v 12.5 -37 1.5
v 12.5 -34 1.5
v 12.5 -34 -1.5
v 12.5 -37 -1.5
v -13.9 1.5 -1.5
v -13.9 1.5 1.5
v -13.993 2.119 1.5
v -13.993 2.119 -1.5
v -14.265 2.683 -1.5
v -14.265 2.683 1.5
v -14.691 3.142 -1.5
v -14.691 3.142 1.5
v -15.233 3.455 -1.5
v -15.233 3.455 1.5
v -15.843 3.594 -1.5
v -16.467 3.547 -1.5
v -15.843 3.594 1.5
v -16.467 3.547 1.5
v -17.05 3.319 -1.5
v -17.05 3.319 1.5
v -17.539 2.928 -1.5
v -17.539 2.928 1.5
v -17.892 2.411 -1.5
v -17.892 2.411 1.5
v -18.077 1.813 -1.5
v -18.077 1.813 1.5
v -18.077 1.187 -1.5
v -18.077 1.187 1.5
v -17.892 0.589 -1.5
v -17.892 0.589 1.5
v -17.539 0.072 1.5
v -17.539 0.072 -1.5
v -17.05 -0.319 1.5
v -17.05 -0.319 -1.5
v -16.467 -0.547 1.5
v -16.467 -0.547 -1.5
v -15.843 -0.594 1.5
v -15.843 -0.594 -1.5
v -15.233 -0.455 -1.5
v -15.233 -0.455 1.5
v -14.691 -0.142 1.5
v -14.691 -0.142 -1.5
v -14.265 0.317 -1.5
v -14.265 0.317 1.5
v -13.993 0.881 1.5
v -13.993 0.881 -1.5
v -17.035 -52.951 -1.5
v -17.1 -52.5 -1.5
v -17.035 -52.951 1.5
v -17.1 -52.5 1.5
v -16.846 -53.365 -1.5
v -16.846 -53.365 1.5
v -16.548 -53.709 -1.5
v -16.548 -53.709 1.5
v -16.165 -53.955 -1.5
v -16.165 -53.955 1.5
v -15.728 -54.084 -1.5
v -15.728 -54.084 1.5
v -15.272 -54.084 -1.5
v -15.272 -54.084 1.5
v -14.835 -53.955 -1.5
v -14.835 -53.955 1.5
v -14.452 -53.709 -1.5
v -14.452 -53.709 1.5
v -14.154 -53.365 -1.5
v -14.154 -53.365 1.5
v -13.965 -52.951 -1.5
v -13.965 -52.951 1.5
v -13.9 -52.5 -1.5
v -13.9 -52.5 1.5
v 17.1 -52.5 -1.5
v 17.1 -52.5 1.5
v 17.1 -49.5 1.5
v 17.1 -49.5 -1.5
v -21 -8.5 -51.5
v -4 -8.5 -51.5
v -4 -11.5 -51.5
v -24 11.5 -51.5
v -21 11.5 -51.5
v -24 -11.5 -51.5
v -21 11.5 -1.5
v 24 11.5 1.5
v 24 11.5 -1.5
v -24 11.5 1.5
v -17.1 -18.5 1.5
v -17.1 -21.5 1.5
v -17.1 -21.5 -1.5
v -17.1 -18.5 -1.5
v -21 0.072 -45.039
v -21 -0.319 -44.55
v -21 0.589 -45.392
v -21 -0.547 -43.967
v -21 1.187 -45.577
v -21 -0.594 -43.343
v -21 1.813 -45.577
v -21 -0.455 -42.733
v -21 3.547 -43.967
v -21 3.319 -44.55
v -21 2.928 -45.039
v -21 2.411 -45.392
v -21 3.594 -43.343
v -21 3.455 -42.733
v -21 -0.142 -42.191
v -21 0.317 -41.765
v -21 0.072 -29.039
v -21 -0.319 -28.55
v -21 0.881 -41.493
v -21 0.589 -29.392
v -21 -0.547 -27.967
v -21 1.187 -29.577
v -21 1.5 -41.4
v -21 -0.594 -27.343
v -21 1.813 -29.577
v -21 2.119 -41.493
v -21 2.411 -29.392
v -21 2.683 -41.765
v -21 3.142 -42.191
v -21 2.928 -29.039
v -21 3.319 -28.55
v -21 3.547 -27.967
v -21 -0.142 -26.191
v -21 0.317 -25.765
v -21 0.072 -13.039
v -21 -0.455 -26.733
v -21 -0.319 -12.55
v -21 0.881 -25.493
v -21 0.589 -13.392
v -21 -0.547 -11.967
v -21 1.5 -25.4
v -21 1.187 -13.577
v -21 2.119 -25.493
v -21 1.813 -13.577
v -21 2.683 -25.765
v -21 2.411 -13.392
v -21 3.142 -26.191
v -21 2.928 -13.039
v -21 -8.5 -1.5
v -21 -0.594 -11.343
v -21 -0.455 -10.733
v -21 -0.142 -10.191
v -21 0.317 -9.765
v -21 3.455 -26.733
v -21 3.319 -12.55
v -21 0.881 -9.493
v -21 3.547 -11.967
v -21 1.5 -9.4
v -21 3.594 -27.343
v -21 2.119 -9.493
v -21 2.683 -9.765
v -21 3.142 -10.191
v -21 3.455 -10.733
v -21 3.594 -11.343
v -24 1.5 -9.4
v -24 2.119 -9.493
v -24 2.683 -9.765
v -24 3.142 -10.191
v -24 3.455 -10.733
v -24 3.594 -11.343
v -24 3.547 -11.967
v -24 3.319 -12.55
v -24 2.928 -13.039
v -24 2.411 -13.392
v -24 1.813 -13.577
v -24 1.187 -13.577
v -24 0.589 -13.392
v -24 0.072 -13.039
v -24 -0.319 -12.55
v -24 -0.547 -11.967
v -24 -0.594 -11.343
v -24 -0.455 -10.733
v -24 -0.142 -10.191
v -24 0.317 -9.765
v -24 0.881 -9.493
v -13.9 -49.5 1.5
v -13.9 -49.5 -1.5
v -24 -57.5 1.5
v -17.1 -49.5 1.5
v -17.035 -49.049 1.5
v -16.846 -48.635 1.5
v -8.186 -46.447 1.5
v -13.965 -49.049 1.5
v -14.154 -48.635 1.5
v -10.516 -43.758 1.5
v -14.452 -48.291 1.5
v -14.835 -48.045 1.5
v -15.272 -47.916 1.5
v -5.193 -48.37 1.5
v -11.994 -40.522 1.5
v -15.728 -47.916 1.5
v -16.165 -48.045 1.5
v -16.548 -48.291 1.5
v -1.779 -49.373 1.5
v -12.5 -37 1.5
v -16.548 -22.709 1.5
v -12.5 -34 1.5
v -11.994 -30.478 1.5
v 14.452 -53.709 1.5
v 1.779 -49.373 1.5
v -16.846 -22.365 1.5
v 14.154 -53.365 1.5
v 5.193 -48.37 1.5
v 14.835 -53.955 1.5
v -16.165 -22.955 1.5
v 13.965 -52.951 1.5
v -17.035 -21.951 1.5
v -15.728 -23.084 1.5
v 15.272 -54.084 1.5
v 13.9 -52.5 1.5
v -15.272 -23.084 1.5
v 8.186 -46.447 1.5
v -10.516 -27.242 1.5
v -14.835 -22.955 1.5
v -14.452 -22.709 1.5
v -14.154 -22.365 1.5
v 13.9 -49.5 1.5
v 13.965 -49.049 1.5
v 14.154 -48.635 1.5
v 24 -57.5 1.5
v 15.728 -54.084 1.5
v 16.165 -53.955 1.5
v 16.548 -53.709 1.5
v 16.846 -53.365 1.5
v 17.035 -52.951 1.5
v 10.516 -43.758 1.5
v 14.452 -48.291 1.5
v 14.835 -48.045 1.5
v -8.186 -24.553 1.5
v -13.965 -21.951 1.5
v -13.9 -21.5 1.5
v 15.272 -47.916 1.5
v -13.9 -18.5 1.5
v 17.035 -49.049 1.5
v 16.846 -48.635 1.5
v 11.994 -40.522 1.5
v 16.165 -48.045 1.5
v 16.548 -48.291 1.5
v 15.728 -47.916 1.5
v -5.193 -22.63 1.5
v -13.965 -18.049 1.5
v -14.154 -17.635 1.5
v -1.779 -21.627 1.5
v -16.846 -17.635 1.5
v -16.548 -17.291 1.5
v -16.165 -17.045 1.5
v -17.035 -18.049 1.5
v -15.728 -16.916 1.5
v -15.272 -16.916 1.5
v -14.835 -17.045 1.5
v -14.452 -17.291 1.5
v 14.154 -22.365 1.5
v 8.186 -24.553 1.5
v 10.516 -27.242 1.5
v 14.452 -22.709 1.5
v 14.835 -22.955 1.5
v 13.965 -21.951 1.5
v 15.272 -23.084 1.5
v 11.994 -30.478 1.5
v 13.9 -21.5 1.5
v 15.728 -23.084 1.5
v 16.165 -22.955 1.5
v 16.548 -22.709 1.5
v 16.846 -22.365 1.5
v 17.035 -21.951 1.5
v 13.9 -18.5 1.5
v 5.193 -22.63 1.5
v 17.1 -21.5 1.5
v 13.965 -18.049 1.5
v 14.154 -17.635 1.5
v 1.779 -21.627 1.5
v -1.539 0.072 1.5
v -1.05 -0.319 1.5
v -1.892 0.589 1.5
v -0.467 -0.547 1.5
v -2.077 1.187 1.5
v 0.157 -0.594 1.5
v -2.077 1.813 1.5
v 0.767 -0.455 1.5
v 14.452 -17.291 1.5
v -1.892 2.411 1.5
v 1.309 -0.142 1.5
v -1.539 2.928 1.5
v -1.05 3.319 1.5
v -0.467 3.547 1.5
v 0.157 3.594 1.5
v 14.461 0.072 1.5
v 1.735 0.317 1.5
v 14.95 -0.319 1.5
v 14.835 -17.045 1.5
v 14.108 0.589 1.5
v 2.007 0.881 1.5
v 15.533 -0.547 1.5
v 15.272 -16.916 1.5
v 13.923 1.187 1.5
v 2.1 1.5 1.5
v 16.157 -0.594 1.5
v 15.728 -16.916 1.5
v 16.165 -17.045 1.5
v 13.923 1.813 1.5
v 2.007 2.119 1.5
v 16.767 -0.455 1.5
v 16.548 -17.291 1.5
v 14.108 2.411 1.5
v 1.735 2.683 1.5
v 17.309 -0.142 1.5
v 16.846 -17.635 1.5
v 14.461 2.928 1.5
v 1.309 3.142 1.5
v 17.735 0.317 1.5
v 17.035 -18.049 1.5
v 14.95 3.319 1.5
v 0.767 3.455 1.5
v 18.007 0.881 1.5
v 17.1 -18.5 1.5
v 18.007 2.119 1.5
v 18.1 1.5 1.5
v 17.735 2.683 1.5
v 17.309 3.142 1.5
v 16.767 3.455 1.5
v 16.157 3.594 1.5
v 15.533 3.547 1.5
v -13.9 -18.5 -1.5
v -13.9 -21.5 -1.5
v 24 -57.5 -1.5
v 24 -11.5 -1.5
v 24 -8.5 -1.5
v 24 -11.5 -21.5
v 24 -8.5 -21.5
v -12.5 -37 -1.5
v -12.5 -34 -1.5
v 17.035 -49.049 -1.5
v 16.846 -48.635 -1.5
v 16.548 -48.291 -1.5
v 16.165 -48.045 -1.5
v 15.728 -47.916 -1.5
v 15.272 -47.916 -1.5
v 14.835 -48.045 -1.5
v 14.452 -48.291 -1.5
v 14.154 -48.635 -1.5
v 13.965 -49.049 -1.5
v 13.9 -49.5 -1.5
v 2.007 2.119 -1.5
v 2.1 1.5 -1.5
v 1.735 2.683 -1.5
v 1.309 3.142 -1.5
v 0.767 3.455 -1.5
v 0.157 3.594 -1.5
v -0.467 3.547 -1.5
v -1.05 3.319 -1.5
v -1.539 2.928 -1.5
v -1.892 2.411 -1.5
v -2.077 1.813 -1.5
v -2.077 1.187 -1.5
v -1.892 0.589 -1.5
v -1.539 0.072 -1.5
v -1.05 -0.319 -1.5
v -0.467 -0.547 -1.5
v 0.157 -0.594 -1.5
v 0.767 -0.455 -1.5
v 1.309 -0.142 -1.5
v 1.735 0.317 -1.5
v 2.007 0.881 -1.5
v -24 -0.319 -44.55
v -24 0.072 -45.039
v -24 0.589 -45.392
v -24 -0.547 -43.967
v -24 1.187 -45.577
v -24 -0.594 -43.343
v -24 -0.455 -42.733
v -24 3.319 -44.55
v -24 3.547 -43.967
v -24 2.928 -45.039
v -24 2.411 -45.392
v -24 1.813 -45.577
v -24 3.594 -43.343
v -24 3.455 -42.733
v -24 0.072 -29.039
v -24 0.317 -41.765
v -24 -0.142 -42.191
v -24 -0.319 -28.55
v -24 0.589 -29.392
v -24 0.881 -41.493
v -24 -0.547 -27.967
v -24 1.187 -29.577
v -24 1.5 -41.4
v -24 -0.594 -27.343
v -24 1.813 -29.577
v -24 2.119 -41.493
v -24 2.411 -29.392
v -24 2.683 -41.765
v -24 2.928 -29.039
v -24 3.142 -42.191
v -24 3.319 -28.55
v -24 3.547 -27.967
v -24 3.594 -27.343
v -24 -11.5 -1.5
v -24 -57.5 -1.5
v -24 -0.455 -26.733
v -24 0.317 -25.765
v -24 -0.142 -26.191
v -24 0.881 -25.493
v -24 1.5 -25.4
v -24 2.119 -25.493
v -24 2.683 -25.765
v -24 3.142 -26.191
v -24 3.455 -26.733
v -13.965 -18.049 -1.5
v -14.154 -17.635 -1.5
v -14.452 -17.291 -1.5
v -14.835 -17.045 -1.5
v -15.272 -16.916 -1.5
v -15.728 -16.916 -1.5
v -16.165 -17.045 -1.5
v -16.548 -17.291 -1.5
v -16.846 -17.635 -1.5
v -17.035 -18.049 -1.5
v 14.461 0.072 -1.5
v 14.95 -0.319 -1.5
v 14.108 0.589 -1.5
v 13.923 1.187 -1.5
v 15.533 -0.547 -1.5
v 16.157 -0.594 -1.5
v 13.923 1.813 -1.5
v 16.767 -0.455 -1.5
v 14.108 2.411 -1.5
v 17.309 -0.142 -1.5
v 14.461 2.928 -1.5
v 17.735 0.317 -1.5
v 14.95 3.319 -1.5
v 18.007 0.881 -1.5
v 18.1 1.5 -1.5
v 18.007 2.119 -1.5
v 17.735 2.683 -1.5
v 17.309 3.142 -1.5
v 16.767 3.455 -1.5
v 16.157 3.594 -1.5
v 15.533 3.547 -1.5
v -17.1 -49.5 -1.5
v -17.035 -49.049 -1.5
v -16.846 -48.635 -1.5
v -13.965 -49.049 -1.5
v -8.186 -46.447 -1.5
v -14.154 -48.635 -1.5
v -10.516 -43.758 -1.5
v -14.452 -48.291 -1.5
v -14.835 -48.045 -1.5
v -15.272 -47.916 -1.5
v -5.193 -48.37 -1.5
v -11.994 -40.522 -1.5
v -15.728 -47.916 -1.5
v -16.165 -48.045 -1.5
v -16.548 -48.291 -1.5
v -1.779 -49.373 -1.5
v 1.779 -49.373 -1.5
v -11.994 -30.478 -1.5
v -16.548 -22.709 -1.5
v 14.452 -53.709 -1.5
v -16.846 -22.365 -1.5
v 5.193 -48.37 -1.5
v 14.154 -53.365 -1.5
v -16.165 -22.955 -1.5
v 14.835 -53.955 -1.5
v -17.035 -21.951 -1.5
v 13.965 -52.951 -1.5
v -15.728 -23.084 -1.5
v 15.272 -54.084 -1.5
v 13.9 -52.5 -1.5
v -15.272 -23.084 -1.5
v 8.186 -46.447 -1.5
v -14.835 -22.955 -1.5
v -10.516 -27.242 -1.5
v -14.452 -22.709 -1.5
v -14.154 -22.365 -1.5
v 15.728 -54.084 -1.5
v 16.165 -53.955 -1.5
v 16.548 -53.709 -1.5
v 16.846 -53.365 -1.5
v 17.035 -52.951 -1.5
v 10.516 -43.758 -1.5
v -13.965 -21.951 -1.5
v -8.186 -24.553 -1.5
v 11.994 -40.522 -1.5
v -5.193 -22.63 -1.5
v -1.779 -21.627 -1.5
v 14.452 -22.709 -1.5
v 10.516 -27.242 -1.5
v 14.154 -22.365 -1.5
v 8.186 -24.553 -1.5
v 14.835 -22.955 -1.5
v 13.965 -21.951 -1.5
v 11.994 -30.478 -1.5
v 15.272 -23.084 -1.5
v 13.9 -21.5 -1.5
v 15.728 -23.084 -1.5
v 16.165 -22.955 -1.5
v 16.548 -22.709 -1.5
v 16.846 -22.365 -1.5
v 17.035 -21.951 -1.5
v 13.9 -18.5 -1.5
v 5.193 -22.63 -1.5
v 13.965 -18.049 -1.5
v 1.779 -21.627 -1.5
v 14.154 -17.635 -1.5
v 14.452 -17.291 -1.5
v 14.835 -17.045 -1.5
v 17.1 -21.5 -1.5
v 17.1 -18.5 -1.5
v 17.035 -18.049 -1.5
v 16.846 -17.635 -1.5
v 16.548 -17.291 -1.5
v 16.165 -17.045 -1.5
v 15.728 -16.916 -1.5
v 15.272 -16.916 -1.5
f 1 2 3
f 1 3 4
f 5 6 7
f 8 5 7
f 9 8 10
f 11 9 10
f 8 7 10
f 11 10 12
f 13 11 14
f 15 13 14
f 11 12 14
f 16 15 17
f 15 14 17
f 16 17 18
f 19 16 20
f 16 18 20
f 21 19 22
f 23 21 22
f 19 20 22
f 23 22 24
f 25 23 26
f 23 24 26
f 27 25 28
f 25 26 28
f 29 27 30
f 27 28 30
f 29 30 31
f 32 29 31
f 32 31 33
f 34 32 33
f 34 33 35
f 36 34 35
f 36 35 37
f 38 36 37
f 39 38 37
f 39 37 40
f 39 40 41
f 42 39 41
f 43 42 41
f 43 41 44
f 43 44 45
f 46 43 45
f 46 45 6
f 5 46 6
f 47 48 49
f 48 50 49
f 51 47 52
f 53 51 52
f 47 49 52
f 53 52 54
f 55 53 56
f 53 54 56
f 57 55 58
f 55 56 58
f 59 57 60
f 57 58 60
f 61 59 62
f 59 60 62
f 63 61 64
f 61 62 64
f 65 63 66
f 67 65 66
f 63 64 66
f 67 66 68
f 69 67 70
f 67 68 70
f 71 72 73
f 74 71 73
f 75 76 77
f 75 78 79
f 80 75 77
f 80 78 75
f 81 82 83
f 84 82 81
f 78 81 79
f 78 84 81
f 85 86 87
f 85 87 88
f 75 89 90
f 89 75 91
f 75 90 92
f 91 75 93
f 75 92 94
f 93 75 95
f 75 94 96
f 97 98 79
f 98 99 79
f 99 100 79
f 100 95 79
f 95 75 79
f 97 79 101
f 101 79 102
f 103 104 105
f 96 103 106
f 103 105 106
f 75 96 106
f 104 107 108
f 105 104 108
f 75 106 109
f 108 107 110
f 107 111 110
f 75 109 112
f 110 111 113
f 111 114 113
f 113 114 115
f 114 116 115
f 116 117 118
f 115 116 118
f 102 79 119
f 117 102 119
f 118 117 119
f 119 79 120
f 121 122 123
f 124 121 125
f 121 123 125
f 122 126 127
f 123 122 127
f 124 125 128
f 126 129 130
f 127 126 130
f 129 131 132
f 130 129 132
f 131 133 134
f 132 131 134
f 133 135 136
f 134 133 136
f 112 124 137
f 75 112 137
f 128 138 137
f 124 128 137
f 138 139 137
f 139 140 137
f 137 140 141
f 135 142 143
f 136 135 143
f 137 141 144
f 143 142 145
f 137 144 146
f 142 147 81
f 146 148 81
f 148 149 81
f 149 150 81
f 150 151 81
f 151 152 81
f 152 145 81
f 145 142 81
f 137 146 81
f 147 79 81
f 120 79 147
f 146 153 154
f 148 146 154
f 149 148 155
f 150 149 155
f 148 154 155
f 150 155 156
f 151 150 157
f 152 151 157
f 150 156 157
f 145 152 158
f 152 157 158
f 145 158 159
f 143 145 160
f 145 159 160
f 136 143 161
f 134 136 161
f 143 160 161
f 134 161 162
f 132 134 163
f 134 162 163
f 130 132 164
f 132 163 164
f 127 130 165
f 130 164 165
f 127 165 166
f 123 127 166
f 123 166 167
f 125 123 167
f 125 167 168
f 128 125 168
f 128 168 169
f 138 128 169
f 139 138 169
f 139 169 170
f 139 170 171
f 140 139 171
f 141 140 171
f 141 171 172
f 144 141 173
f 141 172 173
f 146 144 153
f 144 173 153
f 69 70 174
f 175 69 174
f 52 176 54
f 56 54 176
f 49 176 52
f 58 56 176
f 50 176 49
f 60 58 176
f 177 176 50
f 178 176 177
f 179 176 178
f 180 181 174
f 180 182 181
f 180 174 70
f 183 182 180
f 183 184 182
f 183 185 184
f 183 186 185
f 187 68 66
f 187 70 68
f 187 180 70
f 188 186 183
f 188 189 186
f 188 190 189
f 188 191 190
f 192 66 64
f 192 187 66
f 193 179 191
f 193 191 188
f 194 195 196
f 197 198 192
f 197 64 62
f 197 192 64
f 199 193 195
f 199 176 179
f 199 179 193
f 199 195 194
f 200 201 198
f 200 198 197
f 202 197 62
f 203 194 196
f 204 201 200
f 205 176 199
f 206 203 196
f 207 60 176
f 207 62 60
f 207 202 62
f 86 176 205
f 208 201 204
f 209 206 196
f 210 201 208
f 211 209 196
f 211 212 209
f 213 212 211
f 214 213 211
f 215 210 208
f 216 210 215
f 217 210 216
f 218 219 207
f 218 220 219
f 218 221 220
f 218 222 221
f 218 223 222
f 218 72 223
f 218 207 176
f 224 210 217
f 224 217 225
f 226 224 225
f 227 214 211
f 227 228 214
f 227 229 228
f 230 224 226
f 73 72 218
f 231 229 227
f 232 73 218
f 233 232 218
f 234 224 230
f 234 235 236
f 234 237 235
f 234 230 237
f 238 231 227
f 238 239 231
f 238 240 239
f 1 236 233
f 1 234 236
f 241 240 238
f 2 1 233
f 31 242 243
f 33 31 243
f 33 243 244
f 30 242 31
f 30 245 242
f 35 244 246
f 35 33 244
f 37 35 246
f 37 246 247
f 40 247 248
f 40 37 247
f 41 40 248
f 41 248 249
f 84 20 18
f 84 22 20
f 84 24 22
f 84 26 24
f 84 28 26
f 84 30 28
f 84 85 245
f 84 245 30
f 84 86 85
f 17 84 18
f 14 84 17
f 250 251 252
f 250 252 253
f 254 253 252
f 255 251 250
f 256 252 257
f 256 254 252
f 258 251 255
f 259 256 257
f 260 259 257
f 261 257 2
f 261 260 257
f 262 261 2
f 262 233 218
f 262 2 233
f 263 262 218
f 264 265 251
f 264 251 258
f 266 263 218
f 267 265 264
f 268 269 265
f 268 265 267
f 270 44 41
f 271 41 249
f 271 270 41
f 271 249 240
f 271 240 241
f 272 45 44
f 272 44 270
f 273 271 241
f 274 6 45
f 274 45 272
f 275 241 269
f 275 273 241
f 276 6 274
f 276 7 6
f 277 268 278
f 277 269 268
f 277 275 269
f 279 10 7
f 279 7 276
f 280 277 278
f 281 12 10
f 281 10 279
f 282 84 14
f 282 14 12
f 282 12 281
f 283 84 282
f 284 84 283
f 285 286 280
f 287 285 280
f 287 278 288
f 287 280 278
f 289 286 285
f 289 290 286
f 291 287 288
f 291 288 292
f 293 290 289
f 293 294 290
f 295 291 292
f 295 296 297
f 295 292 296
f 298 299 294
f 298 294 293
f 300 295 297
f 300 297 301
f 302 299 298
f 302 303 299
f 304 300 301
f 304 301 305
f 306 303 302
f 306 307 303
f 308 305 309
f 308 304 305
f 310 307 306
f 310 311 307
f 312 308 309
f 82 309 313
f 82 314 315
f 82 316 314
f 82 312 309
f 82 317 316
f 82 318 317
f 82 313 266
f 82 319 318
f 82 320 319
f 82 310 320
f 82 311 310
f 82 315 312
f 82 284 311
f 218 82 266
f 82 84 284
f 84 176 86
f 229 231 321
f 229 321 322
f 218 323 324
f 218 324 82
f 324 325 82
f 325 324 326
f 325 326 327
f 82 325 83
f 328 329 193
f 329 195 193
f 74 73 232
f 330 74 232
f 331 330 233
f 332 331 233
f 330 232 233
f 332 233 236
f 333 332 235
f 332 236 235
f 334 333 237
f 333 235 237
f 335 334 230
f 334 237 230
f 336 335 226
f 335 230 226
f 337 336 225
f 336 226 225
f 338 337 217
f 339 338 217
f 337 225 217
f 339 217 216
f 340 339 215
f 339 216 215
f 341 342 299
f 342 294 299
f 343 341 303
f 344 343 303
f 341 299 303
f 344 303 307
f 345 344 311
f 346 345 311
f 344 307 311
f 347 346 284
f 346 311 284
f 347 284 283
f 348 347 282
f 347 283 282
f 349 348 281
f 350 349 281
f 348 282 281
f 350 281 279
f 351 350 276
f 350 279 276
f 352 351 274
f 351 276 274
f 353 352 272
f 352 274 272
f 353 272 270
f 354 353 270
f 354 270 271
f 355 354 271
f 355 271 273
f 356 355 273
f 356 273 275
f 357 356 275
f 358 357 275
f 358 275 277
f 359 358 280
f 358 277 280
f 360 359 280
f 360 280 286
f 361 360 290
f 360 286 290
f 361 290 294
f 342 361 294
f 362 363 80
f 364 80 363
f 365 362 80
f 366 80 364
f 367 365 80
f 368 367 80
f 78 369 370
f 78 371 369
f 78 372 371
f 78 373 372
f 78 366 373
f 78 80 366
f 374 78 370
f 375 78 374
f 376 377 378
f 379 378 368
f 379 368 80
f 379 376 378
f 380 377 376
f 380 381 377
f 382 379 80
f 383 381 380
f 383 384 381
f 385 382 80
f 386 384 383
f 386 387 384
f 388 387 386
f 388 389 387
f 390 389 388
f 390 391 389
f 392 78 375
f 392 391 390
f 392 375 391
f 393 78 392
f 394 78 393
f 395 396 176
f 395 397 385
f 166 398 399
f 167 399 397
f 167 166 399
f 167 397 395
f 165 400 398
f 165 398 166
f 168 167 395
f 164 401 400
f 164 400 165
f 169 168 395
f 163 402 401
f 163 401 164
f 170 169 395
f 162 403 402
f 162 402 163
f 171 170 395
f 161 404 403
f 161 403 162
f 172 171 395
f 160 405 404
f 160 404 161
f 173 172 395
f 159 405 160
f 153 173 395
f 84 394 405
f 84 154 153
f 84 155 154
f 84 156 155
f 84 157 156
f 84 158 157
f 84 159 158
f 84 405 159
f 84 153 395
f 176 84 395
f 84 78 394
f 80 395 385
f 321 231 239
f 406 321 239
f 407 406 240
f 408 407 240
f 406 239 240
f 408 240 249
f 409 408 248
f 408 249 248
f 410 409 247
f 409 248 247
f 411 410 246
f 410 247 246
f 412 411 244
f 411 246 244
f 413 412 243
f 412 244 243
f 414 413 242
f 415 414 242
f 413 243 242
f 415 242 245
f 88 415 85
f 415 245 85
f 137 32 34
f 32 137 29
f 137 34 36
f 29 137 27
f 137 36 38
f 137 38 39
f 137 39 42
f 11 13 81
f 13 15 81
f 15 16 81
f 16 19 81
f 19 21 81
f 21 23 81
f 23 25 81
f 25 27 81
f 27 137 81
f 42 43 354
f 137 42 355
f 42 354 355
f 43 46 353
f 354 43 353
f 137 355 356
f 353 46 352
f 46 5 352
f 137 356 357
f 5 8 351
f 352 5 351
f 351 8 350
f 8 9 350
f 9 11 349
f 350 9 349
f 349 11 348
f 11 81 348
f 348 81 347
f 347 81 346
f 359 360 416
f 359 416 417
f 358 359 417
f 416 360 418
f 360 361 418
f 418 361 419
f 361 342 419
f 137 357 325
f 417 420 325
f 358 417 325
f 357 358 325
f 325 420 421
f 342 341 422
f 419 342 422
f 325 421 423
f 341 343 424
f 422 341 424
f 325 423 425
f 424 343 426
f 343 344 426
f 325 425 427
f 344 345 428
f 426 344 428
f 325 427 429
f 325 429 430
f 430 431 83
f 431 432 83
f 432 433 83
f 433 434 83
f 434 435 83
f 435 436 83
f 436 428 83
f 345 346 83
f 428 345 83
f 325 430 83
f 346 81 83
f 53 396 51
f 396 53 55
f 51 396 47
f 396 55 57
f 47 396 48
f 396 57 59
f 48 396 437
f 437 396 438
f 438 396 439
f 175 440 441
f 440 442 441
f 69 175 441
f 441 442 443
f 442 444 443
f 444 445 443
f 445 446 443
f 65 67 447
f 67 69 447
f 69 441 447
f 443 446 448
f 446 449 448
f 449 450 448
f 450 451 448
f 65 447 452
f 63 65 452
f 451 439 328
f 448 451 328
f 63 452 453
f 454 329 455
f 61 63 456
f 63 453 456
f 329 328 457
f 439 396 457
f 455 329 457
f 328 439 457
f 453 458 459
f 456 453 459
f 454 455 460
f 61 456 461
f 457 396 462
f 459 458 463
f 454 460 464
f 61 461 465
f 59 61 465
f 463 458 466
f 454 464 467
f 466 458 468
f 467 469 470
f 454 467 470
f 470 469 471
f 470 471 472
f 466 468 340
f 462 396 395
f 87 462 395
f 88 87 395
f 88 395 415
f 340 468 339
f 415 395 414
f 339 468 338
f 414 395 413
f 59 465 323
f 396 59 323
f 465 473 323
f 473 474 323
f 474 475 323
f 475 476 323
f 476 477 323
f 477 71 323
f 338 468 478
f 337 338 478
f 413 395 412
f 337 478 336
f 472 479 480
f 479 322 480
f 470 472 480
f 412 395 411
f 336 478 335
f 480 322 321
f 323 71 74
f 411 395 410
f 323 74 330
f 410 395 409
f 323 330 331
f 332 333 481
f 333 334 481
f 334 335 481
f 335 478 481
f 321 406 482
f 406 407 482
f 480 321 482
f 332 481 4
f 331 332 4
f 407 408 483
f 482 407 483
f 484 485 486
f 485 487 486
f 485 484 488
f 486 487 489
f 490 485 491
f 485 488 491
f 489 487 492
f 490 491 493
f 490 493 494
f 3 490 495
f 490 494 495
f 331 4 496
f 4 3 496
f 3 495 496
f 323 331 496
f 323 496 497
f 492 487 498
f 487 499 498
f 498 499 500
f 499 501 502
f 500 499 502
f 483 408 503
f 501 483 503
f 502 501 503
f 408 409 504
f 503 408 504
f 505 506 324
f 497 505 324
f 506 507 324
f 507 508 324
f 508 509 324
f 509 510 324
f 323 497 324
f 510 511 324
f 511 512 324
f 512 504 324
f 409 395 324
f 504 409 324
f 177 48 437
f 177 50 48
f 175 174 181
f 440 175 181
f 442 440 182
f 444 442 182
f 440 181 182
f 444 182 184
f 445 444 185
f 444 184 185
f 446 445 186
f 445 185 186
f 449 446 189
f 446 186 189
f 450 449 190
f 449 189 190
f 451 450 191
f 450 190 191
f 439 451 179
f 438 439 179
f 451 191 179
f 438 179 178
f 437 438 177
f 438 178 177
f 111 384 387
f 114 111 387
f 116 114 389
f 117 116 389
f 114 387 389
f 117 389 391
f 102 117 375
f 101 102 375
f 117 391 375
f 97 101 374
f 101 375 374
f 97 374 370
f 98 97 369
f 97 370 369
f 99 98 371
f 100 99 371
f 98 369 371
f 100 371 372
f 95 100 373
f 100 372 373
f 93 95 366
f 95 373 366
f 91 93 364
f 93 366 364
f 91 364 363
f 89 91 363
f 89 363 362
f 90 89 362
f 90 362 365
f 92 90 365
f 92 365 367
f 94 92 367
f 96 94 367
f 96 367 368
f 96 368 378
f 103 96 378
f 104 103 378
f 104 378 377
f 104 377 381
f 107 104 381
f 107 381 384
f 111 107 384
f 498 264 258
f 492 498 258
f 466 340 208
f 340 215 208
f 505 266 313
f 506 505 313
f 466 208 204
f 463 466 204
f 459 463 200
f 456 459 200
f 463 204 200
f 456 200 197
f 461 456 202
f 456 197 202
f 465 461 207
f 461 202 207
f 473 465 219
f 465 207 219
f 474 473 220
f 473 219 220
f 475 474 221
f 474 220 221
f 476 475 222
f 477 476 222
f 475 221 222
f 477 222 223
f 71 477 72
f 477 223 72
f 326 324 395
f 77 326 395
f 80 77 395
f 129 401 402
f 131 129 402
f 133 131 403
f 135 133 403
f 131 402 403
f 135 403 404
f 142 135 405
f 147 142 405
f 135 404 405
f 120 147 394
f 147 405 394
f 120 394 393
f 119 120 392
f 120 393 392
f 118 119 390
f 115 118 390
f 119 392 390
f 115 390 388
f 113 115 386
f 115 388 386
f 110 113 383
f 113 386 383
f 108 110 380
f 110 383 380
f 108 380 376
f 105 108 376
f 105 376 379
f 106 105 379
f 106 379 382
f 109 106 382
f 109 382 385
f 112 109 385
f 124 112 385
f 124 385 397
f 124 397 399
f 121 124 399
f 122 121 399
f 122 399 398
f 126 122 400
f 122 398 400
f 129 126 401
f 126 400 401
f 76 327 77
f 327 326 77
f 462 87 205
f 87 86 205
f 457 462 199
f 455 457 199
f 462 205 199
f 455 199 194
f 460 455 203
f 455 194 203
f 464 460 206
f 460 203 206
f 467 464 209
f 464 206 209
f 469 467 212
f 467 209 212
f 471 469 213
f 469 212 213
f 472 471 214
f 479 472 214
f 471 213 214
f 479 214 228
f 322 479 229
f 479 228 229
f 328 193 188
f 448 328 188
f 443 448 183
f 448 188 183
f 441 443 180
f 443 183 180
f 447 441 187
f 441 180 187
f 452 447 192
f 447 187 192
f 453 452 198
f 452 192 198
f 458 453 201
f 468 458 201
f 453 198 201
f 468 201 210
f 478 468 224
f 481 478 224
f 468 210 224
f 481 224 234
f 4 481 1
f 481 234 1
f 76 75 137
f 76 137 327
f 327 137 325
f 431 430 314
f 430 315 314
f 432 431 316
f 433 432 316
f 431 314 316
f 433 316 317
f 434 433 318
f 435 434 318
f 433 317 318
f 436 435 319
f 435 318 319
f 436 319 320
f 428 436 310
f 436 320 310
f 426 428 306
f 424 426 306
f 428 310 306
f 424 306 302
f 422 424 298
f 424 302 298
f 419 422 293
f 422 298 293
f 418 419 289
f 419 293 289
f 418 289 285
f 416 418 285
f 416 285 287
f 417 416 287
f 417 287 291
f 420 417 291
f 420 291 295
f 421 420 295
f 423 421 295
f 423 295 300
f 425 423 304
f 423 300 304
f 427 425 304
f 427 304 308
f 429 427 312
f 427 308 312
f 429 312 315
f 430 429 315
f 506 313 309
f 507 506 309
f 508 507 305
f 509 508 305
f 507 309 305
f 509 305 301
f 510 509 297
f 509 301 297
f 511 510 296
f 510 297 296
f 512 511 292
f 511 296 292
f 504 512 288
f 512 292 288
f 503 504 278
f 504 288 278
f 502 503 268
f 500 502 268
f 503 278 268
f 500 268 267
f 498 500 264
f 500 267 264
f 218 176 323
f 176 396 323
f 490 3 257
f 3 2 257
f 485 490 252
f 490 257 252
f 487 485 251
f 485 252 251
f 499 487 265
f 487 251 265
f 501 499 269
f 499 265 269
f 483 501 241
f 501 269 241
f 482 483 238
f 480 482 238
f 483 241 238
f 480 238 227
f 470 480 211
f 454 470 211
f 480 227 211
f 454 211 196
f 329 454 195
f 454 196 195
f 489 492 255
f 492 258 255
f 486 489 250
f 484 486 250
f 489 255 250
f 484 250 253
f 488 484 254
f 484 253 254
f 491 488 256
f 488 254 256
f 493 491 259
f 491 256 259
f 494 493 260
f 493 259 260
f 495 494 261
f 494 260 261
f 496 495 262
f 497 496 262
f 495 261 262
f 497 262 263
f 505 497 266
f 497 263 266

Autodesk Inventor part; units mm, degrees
ref_plane "YZ Plane" through (0, 0, 0) normal (1, 0, 0) x (0, 1, 0)
ref_plane "XZ Plane" through (0, 0, 0) normal (0, 1, 0) x (-1, 0, 0)
ref_plane "XY Plane" through (0, 0, 0) normal (0, 0, 1) x (1, 0, 0)
sketch "Sketch1" plane through (0, 0, 0) normal (0, 0, 1) x (1, 0, 0)
  line L0 (-24, 11.5) -> (-24, -11.5)
  line L1 (-24, -11.5) -> (24, -11.5) construction
  line L2 (24, -11.5) -> (24, 11.5)
  line L3 (24, 11.5) -> (-1, 11.5)
  line L4 (-1, 11.5) -> (-24, 11.5)
  line L5 (-24, -11.5) -> (-24, -57.5)
  line L6 (-24, -57.5) -> (24, -57.5)
  line L7 (24, -57.5) -> (24, -11.5)
  point P0 (0, 0)
  point P1 (0, -11.5)
  point P2 (-24, 0)
  point P3 (11.5, 11.5)
  dimension "d0" = 23
  dimension "d1" = 23
  dimension "d2" = 48
  dimension "d6" = 48
  dimension "d7" = 46
extrude "Extrusion1" add sketch "Sketch1" along normal mid plane 3
sketch "Sketch2" plane through (0, 0, 1.5) normal (0, 0, 1) x (1, 0, 0)
  arc A0 (-17.1, -52.5) -> (-13.9, -52.5) centre (-15.5, -52.5) ccw
  arc A1 (-13.9, -18.5) -> (-17.1, -18.5) centre (-15.5, -18.5) ccw
  arc A2 (17.1, -18.5) -> (13.9, -18.5) centre (15.5, -18.5) ccw
  arc A3 (13.9, -52.5) -> (17.1, -52.5) centre (15.5, -52.5) ccw
  arc A4 (-17.1, -21.5) -> (-13.9, -21.5) centre (-15.5, -21.5) ccw
  arc A5 (-13.9, -49.5) -> (-17.1, -49.5) centre (-15.5, -49.5) ccw
  arc A6 (13.9, -21.5) -> (17.1, -21.5) centre (15.5, -21.5) ccw
  arc A7 (17.1, -49.5) -> (13.9, -49.5) centre (15.5, -49.5) ccw
  line L0 (-17.1, -52.5) -> (-17.1, -49.5)
  line L1 (-13.9, -52.5) -> (-13.9, -49.5)
  line L2 (-17.1, -21.5) -> (-17.1, -18.5)
  line L3 (-13.9, -18.5) -> (-13.9, -21.5)
  line L4 (13.9, -18.5) -> (13.9, -21.5)
  line L5 (17.1, -21.5) -> (17.1, -18.5)
  line L6 (13.9, -49.5) -> (13.9, -52.5)
  line L7 (17.1, -52.5) -> (17.1, -49.5)
  line L8 (-24, 11.5) -> (-24, -57.5) projected
  line L9 (-24, -57.5) -> (24, -57.5) projected
  line L10 (-17.1, -51) -> (-13.9, -51) construction
  line L11 (-17.1, -20) -> (-13.9, -20) construction
  point P0 (0, 0)
  dimension "d8" = 3.2
  dimension "d9" = 3
  dimension "d10" = 8.5
  dimension "d11" = 5
  dimension "d12" = 31
  dimension "d13" = 31
  dimension "d14" = 3
extrude "Extrusion2" cut sketch "Sketch2" against normal up to next
sketch "Sketch3" plane through (0, 0, 1.5) normal (0, 0, 1) x (1, 0, 0)
  line L0 (24, 11.5) -> (24, -57.5) projected
  line L1 (24, 11.5) -> (-24, 11.5) construction
  line L2 (-24, -57.5) -> (-24, 11.5) projected
  line L3 (24, 11.5) -> (24, -57.5) projected
  line L4 (24, -57.5) -> (24, 11.5) projected
  line L5 (-24, 11.5) -> (24, 11.5) projected
  circle A0 centre (16, 1.5) radius 2.1
  circle A1 centre (0, 1.5) radius 2.1
  circle A2 centre (-16, 1.5) radius 2.1
  point P0 (0, 0)
  point P1 (35, -11.5)
  point P2 (16.6018, 1.5)
  dimension "d19" = 4.2
  dimension "d20" = 16
  dimension "d21" = 8
  dimension "d23" = 16
  dimension "d52" = 10
sketch "Sketch4" plane through (0, 0, -1.5) normal (0, 0, -1) x (-1, 0, 0)
  line L0 (13.9, -21.5) -> (13.9, -18.5) projected
  arc A0 (17.1, -18.5) -> (13.9, -18.5) centre (15.5, -18.5) ccw projected
  line L1 (17.1, -18.5) -> (17.1, -21.5) projected
  arc A1 (13.9, -21.5) -> (17.1, -21.5) centre (15.5, -21.5) ccw projected
  arc A2 (13.9, -52.5) -> (17.1, -52.5) centre (15.5, -52.5) ccw projected
  line L2 (13.9, -52.5) -> (13.9, -49.5) projected
  arc A3 (17.1, -49.5) -> (13.9, -49.5) centre (15.5, -49.5) ccw projected
  line L3 (17.1, -49.5) -> (17.1, -52.5) projected
  line L4 (-17.1, -52.5) -> (-17.1, -49.5) projected
  arc A4 (-13.9, -49.5) -> (-17.1, -49.5) centre (-15.5, -49.5) ccw projected
  line L5 (-13.9, -49.5) -> (-13.9, -52.5) projected
  arc A5 (-17.1, -52.5) -> (-13.9, -52.5) centre (-15.5, -52.5) ccw projected
  line L6 (-17.1, -21.5) -> (-17.1, -18.5) projected
  arc A6 (-13.9, -18.5) -> (-17.1, -18.5) centre (-15.5, -18.5) ccw projected
  line L7 (-13.9, -18.5) -> (-13.9, -21.5) projected
  arc A7 (-17.1, -21.5) -> (-13.9, -21.5) centre (-15.5, -21.5) ccw projected
  line L8 (24, -57.5) -> (24, 11.5) projected
  line L9 (24, 11.5) -> (-24, 11.5) projected
  line L10 (-24, 11.5) -> (-24, -57.5) projected
  line L11 (-24, -57.5) -> (24, -57.5) projected
  line L12 (-24, 11.5) -> (-24, -11.5) projected
  line L13 (-24, -11.5) -> (24, -11.5)
  line L14 (24, -57.5) -> (24, 11.5) projected
  line L15 (24, -8.5) -> (-24, -8.5)
  point P0 (0, 0)
  point P1 (-35, -11.5)
  dimension "d30" = 3
extrude "Extrusion4" add sketch "Sketch4" along normal blind 50 contours L13 L10 L15 L8
sketch "Sketch8" plane through (0, 0, 1.5) normal (0, 0, 1) x (1, 0, 0)
  arc A0 (12.5, -34) -> (-12.5, -34) centre (0, -34) ccw
  arc A1 (-12.5, -37) -> (12.5, -37) centre (0, -37) ccw
  line L0 (13.9, -21.5) -> (13.9, -18.5) projected
  line L1 (13.9, -20) -> (-13.9, -20) construction
  line L2 (-13.9, -18.5) -> (-13.9, -21.5) projected
  line L3 (-13.9, -20) -> (-13.9, -51) construction
  line L4 (-13.9, -49.5) -> (-13.9, -52.5) projected
  line L5 (12.5, -34) -> (12.5, -37)
  line L6 (-12.5, -34) -> (-12.5, -37)
  point P0 (0, 0)
  point P1 (-12.5, -35.5)
  point P2 (-13.9, -35.5)
  point P3 (0, -21.5)
  point P4 (0, -20)
  dimension "d46" = 25
  dimension "d47" = 3
extrude "Extrusion8" cut sketch "Sketch8" against normal up to next
sketch "Sketch9" plane through (-24, -57.5, 1.5) normal (-1, 0, 0) x (0, 0, 1)
  line L0 (-3, 69) -> (-3, 49) projected
  line L1 (-3, 69) -> (-53, 69)
  line L2 (-3, 49) -> (-53, 49) projected
  line L3 (-53, 46) -> (-53, 49) projected
  line L4 (-53, 69) -> (-53, 49)
  point P0 (-1.5, 57.5)
  point P1 (-53, 0)
extrude "Extrusion9" add sketch "Sketch9" against normal blind 3
extrude "Extrusion10" cut sketch "Sketch3" against normal up to next
sketch "Sketch10" plane through (-24, -11.5, -1.5) normal (0, -1, 0) x (1, 0, 0)
  line L0 (48, 0) -> (48, -50) projected
  line L1 (48, -20) -> (20, -50)
  line L2 (48, 0) -> (0, 0) projected
  line L3 (0, 0) -> (0, -50) projected
  line L4 (48, -50) -> (0, -50) projected
  point P0 (24, 1.5)
  dimension "d55" = 20
  dimension "d56" = 20
extrude "Extrusion11" cut sketch "Sketch10" against normal up to next contours L0 L4 L1
sketch "Sketch11" plane through (-24, -57.5, 1.5) normal (-1, 0, 0) x (0, 0, 1)
  circle A0 centre (-13, 59) radius 2.1
  circle A1 centre (-45, 59) radius 2.1
  circle A2 centre (-29, 59) radius 2.1
  line L0 (0, 69) -> (0, 0) projected
  line L1 (0, 69) -> (-53, 69) projected
  point P0 (-1.5, 57.5)
  dimension "d59" = 4.2
  dimension "d60" = 16
  dimension "d61" = 13
  dimension "d62" = 16
  dimension "d65" = 10
extrude "Extrusion12" cut sketch "Sketch11" against normal up to next
properties part number "MotorMount2"
